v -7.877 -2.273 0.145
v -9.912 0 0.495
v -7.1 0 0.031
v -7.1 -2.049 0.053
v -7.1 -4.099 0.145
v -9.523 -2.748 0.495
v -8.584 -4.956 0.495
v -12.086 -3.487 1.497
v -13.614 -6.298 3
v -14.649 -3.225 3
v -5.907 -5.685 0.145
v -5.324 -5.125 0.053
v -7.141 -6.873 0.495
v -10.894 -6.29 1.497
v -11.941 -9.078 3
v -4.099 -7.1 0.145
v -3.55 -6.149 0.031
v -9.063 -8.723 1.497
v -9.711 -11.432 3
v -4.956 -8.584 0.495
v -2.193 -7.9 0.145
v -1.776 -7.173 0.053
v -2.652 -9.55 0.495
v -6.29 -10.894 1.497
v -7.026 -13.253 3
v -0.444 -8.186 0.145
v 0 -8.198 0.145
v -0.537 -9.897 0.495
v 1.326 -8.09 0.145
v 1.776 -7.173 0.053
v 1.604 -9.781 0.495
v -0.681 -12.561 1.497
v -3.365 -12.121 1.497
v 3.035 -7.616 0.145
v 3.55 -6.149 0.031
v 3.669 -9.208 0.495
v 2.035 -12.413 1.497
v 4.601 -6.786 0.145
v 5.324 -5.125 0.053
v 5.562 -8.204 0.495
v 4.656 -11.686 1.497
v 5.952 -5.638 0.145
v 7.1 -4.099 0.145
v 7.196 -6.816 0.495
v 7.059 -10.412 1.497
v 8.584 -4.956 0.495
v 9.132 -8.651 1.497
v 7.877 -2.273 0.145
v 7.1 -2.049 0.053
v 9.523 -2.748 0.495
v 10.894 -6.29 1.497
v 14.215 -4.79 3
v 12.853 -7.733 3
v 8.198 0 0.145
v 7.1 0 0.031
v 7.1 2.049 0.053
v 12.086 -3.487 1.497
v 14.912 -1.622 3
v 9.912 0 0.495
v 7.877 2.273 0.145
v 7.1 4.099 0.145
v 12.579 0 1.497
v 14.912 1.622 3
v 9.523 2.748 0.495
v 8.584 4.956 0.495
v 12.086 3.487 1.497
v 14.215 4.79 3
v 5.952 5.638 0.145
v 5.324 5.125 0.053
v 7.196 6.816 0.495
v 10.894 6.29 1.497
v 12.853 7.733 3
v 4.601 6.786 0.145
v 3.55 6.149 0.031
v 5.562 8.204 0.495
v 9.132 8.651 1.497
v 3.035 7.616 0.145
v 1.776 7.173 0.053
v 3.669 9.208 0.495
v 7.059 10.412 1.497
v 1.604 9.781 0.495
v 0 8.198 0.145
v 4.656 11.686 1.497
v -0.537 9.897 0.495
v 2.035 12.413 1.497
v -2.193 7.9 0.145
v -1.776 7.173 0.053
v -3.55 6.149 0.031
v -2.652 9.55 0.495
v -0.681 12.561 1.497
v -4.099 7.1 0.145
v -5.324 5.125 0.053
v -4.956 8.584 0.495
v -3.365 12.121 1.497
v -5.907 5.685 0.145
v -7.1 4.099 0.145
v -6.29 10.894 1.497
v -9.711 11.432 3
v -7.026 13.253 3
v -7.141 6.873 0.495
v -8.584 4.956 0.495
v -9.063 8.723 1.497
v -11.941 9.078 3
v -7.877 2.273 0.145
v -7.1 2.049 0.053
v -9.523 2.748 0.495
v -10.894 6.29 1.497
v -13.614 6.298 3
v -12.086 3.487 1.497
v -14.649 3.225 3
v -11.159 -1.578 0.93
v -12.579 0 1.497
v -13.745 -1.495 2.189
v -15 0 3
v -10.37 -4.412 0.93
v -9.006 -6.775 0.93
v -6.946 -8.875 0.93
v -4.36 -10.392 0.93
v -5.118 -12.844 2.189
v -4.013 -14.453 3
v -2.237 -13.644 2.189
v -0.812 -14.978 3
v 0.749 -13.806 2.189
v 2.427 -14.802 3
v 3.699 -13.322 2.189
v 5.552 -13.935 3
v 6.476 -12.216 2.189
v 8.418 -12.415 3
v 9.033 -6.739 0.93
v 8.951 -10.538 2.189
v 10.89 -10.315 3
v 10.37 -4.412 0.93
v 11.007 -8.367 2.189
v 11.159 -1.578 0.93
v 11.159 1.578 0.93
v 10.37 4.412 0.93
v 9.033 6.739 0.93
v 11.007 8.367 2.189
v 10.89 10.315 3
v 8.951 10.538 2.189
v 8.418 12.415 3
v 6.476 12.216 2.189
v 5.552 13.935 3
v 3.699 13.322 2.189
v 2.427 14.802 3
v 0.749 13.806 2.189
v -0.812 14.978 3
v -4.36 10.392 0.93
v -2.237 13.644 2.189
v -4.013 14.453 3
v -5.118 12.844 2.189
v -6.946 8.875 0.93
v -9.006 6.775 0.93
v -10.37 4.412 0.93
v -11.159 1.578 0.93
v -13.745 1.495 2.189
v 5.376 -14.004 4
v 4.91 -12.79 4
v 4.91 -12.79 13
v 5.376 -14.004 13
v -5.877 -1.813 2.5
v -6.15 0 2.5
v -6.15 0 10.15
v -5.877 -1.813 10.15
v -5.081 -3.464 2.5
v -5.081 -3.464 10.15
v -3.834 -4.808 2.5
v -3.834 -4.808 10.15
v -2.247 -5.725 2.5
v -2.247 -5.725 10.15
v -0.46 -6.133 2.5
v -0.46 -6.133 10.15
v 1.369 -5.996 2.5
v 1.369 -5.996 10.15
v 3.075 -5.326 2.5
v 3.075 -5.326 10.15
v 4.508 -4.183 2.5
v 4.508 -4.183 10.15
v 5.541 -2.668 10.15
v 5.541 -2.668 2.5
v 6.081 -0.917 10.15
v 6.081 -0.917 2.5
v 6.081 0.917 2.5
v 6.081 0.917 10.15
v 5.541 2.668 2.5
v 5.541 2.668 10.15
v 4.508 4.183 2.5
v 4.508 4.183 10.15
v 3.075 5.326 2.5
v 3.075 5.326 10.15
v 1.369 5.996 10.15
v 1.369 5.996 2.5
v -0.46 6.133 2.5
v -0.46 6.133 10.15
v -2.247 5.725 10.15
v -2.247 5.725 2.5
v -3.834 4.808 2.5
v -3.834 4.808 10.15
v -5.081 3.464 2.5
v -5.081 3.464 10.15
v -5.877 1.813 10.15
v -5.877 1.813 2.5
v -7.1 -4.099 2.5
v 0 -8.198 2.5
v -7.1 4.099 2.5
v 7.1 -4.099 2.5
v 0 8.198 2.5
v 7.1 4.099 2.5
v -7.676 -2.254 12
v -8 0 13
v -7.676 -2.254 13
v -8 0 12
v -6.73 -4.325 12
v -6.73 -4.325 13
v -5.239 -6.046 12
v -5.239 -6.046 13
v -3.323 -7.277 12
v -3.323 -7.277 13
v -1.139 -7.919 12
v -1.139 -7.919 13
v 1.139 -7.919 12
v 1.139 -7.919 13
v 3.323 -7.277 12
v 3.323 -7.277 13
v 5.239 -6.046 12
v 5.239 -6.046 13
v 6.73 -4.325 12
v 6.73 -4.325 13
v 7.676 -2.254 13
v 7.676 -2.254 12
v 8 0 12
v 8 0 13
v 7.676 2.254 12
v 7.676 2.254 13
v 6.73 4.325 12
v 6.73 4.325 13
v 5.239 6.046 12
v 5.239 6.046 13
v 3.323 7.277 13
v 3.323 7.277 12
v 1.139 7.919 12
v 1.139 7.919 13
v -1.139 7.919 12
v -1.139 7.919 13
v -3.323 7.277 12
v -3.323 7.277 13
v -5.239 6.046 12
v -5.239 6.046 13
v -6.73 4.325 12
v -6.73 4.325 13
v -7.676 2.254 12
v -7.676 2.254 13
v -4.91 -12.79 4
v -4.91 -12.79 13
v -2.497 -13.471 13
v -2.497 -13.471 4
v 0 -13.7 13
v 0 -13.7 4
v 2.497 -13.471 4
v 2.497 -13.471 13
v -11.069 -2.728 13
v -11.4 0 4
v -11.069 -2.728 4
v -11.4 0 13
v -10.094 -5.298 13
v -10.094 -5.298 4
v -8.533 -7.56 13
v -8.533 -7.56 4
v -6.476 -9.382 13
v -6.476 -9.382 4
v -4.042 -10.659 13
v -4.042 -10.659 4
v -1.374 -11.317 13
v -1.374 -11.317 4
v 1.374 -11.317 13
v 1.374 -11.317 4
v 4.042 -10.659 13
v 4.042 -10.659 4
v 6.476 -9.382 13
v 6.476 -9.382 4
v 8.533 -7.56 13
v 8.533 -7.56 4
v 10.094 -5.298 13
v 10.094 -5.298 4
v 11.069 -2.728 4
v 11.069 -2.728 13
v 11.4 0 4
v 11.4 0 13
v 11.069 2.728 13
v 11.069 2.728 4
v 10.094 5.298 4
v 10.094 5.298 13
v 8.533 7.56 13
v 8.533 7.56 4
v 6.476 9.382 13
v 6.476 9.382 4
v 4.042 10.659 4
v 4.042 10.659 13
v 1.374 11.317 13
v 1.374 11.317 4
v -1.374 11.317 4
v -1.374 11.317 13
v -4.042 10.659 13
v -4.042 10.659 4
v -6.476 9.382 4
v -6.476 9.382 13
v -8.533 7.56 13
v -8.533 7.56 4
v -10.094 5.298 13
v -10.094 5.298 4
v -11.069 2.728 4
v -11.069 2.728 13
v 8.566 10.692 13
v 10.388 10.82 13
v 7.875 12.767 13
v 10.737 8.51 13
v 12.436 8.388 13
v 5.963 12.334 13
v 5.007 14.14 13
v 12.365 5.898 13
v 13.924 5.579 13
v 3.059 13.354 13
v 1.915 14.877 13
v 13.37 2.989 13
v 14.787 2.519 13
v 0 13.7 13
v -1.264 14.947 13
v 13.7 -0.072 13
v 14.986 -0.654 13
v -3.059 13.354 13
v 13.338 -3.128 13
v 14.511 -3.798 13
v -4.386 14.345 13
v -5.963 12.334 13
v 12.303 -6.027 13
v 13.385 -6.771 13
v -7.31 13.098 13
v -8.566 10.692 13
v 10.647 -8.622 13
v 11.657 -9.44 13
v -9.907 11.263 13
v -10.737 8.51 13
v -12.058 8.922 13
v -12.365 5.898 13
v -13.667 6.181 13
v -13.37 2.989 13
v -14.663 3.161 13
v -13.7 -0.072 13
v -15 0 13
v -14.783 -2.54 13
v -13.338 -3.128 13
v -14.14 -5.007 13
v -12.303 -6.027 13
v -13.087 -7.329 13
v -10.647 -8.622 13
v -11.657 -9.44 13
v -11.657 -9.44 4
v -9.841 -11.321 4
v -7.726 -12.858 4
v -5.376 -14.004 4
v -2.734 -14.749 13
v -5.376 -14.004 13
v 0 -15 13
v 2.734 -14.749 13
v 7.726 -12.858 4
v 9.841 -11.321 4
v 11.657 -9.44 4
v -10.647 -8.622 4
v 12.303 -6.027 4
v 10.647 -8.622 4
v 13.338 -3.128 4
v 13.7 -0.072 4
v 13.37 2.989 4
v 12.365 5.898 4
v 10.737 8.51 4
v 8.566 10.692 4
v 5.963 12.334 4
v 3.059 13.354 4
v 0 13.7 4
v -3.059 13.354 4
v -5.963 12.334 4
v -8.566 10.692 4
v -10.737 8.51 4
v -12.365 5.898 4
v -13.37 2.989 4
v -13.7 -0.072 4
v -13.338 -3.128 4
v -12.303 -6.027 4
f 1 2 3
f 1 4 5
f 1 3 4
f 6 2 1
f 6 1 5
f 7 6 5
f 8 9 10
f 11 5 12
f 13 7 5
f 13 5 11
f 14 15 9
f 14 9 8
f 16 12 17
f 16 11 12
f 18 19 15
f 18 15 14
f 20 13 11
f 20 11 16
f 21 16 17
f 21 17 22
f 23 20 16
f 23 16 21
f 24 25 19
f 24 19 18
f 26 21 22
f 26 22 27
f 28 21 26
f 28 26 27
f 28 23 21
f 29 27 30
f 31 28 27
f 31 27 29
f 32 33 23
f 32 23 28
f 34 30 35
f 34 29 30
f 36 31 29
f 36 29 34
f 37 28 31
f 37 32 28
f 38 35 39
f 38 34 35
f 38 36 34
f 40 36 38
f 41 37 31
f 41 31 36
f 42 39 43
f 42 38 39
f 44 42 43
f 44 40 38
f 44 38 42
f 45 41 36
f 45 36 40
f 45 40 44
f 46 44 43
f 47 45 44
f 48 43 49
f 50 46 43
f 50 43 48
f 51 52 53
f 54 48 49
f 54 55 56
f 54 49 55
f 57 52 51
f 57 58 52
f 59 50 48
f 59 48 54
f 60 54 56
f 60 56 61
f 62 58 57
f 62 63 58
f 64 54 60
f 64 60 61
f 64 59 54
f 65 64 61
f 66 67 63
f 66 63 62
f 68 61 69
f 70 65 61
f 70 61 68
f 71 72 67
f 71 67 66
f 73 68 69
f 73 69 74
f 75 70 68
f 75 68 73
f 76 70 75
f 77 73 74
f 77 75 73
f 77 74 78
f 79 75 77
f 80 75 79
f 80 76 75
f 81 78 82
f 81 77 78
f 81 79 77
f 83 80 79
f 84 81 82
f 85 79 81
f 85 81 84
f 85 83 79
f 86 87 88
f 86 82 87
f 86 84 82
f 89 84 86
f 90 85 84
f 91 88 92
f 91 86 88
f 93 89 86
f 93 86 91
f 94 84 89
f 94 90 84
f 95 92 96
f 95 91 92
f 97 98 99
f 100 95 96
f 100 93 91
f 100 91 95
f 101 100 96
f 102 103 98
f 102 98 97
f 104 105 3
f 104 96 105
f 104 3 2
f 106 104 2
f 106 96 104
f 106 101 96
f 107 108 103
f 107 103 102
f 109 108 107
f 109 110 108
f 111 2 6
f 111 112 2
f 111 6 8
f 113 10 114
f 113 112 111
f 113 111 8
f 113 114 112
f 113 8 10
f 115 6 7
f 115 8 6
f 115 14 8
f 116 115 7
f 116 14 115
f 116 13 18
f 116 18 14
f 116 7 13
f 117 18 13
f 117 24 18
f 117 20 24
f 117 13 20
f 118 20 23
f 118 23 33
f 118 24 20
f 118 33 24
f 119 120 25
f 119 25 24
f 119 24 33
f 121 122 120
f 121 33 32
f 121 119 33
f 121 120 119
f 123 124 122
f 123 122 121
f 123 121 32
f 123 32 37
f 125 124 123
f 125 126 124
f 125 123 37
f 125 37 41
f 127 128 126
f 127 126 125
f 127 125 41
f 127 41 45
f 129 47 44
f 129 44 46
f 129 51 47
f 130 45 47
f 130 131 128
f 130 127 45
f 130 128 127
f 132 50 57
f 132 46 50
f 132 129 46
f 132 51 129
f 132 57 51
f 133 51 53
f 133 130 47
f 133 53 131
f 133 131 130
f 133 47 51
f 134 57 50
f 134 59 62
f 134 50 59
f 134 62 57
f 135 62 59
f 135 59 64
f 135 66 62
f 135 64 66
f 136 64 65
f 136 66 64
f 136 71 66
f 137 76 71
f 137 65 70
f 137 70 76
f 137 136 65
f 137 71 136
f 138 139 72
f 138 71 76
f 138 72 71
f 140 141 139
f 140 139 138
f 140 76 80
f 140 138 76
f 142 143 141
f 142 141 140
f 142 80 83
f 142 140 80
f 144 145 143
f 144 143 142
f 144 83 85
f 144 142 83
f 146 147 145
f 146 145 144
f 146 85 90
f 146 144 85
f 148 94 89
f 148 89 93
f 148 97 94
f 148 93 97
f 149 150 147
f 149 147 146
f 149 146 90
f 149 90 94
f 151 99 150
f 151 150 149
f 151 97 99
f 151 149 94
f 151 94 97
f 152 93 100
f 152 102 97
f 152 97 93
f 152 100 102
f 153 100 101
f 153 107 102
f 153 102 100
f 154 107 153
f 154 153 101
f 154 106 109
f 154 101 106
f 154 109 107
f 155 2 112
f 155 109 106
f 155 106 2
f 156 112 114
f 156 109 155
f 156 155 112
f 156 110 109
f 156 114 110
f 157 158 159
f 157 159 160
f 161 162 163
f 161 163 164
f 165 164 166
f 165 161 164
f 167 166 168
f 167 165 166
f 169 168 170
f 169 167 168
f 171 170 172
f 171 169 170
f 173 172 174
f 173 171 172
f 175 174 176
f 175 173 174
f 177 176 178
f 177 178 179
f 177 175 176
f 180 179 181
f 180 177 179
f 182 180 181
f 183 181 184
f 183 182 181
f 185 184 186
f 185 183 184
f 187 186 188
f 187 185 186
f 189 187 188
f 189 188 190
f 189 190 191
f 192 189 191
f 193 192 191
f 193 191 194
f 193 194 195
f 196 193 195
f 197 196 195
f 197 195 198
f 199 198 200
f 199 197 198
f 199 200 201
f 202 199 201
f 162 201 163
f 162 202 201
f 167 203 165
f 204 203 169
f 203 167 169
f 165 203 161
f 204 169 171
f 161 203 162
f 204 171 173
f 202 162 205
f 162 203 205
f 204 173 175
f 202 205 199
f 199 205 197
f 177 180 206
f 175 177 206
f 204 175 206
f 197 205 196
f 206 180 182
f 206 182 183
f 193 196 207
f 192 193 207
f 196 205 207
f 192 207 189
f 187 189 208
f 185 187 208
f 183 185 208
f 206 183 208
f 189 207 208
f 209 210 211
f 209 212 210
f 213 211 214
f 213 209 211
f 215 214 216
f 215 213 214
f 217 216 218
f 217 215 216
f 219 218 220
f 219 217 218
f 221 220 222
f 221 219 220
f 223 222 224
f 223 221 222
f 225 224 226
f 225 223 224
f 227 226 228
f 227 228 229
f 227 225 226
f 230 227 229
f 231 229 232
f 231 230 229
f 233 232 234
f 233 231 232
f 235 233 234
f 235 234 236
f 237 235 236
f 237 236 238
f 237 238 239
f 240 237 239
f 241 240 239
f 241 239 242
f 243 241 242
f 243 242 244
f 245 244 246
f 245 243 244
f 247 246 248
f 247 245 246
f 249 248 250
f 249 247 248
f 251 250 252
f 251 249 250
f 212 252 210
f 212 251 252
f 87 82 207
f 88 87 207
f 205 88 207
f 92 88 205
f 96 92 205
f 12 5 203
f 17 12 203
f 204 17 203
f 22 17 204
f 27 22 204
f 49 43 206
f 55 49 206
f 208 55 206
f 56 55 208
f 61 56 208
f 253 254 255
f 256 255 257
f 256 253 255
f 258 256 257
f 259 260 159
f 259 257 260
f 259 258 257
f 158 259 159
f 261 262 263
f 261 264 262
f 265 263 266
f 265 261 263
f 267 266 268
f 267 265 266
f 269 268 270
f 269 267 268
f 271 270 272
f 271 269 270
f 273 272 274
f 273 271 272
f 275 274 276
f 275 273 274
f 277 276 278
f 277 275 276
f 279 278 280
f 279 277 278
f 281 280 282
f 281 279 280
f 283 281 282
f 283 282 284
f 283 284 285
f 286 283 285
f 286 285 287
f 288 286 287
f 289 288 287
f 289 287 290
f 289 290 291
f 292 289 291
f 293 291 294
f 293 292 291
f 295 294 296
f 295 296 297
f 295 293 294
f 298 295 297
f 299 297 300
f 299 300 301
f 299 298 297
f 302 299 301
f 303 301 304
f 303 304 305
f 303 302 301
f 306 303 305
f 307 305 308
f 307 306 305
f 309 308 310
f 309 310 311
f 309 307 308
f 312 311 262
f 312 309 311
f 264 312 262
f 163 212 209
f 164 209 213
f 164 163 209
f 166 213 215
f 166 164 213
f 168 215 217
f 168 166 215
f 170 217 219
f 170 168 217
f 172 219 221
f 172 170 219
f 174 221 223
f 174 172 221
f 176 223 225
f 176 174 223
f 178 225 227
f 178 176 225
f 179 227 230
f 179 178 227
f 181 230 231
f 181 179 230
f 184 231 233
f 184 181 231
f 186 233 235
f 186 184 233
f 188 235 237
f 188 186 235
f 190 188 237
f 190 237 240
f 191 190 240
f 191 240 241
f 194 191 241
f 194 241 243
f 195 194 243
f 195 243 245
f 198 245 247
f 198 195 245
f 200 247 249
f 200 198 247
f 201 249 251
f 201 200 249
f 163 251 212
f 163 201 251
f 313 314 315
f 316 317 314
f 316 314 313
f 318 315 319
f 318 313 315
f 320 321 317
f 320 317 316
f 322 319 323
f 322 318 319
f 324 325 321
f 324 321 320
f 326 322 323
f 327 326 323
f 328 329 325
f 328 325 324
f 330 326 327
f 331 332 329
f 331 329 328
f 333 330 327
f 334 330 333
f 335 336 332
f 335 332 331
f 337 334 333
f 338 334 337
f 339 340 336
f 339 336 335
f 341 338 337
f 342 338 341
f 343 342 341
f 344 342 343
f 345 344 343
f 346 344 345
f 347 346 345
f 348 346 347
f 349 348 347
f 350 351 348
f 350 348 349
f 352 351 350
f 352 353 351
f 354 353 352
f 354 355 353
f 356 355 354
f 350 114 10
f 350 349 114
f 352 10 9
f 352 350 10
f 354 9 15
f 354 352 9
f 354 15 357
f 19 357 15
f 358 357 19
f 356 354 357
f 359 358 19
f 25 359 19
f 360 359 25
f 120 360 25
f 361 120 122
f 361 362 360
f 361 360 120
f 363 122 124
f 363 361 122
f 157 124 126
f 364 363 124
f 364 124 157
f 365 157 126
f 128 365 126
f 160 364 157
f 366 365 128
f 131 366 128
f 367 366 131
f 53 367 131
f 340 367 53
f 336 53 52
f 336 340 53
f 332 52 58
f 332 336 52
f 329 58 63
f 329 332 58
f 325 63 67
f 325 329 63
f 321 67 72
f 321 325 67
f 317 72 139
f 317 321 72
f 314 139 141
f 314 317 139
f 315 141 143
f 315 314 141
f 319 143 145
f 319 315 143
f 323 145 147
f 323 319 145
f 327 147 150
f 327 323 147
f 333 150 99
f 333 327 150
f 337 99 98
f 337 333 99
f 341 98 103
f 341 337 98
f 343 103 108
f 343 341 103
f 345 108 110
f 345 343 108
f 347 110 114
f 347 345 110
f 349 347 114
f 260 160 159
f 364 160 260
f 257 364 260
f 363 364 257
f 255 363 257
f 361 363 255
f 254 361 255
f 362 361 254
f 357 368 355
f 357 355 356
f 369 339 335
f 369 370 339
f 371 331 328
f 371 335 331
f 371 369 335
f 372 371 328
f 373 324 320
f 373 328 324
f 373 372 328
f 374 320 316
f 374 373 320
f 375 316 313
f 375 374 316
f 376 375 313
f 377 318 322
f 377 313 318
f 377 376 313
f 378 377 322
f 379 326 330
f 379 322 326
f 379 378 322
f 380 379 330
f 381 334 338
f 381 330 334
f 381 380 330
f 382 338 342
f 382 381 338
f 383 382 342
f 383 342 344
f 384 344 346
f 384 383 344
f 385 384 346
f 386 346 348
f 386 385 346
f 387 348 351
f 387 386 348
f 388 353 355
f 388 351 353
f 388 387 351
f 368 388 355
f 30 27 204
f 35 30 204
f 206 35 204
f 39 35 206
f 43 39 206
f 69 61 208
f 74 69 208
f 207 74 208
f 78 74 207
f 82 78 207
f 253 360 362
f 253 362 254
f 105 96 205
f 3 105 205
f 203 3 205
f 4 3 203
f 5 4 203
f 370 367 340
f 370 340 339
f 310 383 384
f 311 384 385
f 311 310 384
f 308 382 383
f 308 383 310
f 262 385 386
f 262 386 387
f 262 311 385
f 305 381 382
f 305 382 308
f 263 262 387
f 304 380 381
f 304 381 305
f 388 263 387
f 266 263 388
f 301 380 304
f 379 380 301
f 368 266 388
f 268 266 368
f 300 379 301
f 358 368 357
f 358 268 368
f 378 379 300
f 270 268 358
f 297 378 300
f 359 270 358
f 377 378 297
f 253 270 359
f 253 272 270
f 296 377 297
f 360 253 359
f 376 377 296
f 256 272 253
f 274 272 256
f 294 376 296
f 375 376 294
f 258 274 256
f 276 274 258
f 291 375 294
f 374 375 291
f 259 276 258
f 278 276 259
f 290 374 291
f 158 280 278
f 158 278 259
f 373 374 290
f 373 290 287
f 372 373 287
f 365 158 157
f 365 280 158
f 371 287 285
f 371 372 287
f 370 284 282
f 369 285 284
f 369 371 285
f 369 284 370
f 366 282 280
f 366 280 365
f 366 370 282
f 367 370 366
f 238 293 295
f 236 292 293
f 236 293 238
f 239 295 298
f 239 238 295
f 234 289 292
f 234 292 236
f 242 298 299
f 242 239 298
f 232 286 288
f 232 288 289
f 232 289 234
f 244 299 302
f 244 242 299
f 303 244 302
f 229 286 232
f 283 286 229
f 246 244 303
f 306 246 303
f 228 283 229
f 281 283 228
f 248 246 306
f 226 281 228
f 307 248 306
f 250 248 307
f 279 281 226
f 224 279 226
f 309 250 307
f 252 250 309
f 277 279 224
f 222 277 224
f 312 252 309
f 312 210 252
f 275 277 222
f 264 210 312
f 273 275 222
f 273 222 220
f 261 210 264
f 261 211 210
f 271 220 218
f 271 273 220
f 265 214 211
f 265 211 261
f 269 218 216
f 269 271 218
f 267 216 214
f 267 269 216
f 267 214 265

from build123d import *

# Parameters (mm, degrees)
CUT_EXTRUDE4_DEPTH = 2.5
CUT_REVOLVE1_START = 4
CUT_REVOLVE1_DEPTH = 9
CIRPATTERN1_COUNT  = 5


# Read off the part's stored shape, not the designer's step: Cut-Revolve1
with BuildPart() as part:
    # Sketch1 → Revolve1 (revolve)
    with BuildSketch(Plane(origin=(0, 0, 0), x_dir=(1, 0, 0), z_dir=(0, 1, 0)), mode=Mode.PRIVATE) as revolve1_sk:
        with BuildLine():
            Line((6.15, -10.15), (6.15, 0))
            ThreePointArc((6.15, 0), (10.822325438, -0.770389957), (15, -3))
            Line((15, -3), (15, -13))
            Line((15, -13), (13.7, -13))
            Line((13.7, -13), (13.7, -4))
            Line((13.7, -4), (11.4, -4))
            Line((11.4, -4), (11.4, -13))
            Line((11.4, -13), (8, -13))
            Line((8, -13), (8, -12))
            Line((8, -12), (6.15, -10.15))
        make_face()
    revolve(revolve1_sk.sketch.rotate(Axis((0, 0, 0), (0, 0, 1)), 180), axis=Axis((0, 0, 0), (0, 0, 1)))

    # Sketch7 → Cut-Extrude4 (cut)
    with BuildSketch(Plane.XY):
        Polygon((0, -8.198373822), (7.1, -4.099186911), (7.1, 4.099186911), (0, 8.198373822), (-7.1, 4.099186911), (-7.1, -4.099186911), align=None)
    extrude(amount=CUT_EXTRUDE4_DEPTH, mode=Mode.SUBTRACT)

    # Cut-Revolve1 outline → Cut-Revolve1 (cut)
    with BuildSketch(Plane.XY.offset(CUT_REVOLVE1_START)):
        with BuildLine():
            Line((11.657189422, -9.439805866), (10.646899672, -8.621689357))
            ThreePointArc((10.646899672, -8.621689357), (8.052657957, -11.083532823), (4.909640909, -12.790051843))
            Line((4.909640909, -12.790051843), (5.375519243, -14.003706397))
            ThreePointArc((5.375519243, -14.003706397), (8.816778784, -12.135254916), (11.657189422, -9.439805866))
        make_face()
    cut_revolve1 = extrude(amount=CUT_REVOLVE1_DEPTH, mode=Mode.SUBTRACT)

    # CirPattern1: Cut-Revolve1 ×5 about axis, 3 skipped
    cirpattern1_axis = Axis((0, 0, -1.227748989), (0, 0, 1))
    add([cut_revolve1.rotate(cirpattern1_axis, i * 360 / CIRPATTERN1_COUNT) for i in range(1, CIRPATTERN1_COUNT) if i not in (1, 2, 3)], mode=Mode.SUBTRACT)


solid = part.part
